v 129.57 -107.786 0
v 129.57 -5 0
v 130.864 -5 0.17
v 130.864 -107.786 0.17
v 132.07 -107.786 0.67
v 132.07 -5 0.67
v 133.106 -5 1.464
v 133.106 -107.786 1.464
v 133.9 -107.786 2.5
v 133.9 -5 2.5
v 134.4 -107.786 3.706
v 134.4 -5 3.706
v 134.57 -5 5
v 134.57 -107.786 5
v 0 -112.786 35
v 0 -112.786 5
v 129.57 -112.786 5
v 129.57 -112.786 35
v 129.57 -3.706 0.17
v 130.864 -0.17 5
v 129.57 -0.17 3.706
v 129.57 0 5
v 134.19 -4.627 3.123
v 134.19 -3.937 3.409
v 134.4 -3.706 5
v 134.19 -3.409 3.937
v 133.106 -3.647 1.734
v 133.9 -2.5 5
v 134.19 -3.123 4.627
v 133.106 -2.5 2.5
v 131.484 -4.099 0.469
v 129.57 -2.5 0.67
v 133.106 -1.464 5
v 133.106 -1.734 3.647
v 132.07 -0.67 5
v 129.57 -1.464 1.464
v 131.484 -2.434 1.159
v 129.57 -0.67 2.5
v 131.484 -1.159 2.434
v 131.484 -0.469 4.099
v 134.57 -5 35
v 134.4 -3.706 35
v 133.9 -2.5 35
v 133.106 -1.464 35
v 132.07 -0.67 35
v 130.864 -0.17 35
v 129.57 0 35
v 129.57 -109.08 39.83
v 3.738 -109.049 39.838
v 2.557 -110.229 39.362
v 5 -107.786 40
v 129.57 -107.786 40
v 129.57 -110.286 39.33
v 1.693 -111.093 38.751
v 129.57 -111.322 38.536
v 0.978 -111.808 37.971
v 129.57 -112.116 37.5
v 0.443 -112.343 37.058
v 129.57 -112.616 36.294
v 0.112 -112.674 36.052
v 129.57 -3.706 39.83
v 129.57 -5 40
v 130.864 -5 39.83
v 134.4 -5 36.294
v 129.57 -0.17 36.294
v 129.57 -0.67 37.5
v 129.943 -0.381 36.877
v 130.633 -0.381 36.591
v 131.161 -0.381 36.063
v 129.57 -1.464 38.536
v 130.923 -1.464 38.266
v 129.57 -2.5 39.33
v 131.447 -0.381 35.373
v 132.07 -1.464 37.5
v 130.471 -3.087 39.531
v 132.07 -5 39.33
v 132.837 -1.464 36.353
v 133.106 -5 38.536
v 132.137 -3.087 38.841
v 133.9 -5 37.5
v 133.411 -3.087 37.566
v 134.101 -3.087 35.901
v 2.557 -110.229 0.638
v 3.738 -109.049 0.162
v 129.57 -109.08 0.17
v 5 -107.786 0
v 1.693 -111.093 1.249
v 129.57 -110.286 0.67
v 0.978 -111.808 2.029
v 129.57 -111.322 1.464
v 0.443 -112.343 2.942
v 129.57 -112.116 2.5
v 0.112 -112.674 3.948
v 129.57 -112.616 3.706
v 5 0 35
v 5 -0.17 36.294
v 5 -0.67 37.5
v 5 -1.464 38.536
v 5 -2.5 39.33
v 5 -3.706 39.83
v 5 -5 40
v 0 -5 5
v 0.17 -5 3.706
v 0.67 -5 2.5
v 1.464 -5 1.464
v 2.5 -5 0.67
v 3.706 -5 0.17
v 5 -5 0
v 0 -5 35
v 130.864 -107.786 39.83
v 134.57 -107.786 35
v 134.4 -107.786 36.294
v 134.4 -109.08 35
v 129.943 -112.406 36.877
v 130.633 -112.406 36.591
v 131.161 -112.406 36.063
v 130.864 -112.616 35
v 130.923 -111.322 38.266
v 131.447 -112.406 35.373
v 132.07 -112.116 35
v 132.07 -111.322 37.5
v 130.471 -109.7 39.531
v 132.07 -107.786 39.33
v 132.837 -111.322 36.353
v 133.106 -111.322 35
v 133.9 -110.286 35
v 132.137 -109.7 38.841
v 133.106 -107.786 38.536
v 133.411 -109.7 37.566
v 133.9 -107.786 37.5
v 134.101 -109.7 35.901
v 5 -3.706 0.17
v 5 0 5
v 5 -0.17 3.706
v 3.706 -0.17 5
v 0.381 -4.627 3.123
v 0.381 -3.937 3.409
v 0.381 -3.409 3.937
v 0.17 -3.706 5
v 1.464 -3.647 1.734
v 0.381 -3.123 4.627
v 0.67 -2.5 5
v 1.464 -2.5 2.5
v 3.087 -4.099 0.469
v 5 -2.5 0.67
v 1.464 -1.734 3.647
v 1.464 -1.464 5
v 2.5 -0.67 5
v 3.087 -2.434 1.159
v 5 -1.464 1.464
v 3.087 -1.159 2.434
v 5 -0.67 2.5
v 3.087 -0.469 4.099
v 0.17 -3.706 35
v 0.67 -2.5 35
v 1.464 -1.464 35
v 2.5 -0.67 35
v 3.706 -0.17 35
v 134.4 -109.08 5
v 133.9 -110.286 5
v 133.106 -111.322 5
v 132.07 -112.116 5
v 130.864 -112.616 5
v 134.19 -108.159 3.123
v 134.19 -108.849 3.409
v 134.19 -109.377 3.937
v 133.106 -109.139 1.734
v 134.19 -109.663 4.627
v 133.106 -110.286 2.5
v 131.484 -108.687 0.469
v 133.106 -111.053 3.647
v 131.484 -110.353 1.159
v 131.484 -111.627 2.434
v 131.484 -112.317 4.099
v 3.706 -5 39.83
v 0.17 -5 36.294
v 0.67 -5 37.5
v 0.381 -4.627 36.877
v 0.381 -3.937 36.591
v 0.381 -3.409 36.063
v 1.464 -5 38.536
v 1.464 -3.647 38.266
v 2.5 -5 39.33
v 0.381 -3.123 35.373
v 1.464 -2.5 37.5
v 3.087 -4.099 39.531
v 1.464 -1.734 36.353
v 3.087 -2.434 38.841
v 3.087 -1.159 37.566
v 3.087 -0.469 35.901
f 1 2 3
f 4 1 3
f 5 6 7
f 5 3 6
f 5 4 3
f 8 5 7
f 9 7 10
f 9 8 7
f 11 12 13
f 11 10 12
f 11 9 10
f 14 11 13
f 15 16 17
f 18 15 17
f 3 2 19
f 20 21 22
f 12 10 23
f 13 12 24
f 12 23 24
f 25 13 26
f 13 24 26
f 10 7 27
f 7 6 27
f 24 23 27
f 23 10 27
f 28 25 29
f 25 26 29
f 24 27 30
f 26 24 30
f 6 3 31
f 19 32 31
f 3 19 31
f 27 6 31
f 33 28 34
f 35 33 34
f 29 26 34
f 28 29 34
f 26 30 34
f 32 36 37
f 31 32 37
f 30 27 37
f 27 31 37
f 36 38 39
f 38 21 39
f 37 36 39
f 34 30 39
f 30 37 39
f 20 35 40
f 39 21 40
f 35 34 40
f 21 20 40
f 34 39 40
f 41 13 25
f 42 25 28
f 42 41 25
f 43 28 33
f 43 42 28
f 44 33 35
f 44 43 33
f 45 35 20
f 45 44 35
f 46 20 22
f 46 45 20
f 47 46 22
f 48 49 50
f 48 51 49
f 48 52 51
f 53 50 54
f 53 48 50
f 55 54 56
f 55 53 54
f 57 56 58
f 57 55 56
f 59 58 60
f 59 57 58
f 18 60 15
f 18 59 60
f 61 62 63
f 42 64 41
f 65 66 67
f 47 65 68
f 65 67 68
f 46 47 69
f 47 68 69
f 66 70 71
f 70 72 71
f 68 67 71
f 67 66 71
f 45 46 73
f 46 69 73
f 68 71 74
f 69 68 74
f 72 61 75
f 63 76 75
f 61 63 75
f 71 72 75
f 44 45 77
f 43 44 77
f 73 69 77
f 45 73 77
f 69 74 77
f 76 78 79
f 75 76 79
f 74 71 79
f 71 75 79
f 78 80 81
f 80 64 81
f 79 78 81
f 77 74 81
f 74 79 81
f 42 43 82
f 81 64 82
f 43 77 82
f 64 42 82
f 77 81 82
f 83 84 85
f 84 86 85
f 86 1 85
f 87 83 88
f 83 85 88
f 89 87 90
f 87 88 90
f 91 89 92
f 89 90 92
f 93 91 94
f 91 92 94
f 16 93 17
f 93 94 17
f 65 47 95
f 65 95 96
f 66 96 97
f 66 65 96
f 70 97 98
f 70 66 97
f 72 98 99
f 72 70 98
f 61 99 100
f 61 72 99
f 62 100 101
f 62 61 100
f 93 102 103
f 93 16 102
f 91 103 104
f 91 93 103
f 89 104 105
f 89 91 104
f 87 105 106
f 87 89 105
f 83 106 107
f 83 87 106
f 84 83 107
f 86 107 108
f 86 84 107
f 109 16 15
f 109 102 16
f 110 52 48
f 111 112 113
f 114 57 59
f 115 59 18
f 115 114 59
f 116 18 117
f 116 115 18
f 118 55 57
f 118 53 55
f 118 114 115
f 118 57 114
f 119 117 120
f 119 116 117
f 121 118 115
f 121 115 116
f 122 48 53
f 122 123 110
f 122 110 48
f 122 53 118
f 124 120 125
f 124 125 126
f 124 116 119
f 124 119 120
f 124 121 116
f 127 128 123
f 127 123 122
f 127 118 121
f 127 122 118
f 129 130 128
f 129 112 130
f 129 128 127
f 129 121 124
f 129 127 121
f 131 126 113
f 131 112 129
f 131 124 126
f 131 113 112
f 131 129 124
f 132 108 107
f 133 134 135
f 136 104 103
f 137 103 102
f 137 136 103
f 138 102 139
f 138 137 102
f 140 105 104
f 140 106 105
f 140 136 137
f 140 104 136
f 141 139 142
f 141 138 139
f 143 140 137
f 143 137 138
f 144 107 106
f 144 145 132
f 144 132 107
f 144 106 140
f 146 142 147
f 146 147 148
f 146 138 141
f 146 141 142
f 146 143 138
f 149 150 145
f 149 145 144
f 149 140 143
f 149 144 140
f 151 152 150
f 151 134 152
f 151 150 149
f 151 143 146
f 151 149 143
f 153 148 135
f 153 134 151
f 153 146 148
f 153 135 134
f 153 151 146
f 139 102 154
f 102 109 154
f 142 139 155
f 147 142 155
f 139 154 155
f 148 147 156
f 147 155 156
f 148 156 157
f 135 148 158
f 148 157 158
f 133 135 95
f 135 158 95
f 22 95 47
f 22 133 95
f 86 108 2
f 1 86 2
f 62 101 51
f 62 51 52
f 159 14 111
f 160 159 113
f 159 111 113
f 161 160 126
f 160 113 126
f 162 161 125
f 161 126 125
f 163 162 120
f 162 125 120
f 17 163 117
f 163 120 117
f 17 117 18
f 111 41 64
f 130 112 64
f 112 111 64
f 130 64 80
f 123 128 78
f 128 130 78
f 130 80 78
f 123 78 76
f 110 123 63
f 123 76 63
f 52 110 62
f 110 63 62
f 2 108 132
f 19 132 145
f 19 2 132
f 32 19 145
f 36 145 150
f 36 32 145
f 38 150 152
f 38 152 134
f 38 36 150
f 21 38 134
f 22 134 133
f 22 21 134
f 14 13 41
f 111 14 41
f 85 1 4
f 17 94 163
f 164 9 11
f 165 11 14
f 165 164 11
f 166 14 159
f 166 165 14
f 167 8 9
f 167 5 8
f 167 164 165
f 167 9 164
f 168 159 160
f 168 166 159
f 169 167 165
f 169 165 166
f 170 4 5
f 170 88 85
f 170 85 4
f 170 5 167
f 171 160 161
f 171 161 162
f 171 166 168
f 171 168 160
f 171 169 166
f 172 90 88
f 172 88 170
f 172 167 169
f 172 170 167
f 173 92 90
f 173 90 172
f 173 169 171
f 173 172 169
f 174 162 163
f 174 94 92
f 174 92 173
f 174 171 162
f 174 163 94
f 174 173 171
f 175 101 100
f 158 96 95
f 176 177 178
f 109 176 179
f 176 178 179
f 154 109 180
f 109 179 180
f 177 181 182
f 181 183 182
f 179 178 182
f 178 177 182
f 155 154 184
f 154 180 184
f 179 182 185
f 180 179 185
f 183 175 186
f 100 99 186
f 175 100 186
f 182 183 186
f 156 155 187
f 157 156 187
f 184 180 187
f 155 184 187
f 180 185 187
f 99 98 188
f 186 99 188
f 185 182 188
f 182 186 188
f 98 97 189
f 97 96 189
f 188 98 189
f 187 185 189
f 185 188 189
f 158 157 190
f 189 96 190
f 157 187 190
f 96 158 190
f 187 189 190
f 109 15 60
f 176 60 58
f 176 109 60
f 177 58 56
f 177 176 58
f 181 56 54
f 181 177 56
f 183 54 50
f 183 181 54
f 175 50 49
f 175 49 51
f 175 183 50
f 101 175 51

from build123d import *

# Parameters (mm, degrees)
F0_W     = 134.5701217651
F0_H     = 87.3861983418
F1_DEPTH = 40
F2_DEPTH = 25.4
F3_R     = 5


with BuildPart() as f1:
    # F0 (on Top) → F1 (new body)
    with BuildSketch(Plane.XY):
        with Locations((67.2850608826, -43.6930991709)):
            Rectangle(F0_W, F0_H)
    extrude(amount=F1_DEPTH)

    # F2 (add): a face of the model
    f2_faces = [f1.faces().sort_by_distance(p)[0] for p in [
        (67.2850608826, -87.3861983418, 20),
    ]]
    extrude(f2_faces, amount=F2_DEPTH)

    # F3
    f3_edges = [f1.edges().sort_by_distance(p)[0] for p in [
        (134.570122, -56.393099, 40),
        (67.285061, 0, 40),
        (0, -56.393099, 40),
        (67.285061, -112.786198, 40),
        (67.285061, 0, 0),
        (0, -56.393099, 0),
        (67.285061, -112.786198, 0),
        (134.570122, -56.393099, 0),
        (134.570122, 0, 20),
        (134.570122, -112.786198, 20),
        (0, 0, 20),
    ]]
    fillet(f3_edges, radius=F3_R)


solid = f1.part
